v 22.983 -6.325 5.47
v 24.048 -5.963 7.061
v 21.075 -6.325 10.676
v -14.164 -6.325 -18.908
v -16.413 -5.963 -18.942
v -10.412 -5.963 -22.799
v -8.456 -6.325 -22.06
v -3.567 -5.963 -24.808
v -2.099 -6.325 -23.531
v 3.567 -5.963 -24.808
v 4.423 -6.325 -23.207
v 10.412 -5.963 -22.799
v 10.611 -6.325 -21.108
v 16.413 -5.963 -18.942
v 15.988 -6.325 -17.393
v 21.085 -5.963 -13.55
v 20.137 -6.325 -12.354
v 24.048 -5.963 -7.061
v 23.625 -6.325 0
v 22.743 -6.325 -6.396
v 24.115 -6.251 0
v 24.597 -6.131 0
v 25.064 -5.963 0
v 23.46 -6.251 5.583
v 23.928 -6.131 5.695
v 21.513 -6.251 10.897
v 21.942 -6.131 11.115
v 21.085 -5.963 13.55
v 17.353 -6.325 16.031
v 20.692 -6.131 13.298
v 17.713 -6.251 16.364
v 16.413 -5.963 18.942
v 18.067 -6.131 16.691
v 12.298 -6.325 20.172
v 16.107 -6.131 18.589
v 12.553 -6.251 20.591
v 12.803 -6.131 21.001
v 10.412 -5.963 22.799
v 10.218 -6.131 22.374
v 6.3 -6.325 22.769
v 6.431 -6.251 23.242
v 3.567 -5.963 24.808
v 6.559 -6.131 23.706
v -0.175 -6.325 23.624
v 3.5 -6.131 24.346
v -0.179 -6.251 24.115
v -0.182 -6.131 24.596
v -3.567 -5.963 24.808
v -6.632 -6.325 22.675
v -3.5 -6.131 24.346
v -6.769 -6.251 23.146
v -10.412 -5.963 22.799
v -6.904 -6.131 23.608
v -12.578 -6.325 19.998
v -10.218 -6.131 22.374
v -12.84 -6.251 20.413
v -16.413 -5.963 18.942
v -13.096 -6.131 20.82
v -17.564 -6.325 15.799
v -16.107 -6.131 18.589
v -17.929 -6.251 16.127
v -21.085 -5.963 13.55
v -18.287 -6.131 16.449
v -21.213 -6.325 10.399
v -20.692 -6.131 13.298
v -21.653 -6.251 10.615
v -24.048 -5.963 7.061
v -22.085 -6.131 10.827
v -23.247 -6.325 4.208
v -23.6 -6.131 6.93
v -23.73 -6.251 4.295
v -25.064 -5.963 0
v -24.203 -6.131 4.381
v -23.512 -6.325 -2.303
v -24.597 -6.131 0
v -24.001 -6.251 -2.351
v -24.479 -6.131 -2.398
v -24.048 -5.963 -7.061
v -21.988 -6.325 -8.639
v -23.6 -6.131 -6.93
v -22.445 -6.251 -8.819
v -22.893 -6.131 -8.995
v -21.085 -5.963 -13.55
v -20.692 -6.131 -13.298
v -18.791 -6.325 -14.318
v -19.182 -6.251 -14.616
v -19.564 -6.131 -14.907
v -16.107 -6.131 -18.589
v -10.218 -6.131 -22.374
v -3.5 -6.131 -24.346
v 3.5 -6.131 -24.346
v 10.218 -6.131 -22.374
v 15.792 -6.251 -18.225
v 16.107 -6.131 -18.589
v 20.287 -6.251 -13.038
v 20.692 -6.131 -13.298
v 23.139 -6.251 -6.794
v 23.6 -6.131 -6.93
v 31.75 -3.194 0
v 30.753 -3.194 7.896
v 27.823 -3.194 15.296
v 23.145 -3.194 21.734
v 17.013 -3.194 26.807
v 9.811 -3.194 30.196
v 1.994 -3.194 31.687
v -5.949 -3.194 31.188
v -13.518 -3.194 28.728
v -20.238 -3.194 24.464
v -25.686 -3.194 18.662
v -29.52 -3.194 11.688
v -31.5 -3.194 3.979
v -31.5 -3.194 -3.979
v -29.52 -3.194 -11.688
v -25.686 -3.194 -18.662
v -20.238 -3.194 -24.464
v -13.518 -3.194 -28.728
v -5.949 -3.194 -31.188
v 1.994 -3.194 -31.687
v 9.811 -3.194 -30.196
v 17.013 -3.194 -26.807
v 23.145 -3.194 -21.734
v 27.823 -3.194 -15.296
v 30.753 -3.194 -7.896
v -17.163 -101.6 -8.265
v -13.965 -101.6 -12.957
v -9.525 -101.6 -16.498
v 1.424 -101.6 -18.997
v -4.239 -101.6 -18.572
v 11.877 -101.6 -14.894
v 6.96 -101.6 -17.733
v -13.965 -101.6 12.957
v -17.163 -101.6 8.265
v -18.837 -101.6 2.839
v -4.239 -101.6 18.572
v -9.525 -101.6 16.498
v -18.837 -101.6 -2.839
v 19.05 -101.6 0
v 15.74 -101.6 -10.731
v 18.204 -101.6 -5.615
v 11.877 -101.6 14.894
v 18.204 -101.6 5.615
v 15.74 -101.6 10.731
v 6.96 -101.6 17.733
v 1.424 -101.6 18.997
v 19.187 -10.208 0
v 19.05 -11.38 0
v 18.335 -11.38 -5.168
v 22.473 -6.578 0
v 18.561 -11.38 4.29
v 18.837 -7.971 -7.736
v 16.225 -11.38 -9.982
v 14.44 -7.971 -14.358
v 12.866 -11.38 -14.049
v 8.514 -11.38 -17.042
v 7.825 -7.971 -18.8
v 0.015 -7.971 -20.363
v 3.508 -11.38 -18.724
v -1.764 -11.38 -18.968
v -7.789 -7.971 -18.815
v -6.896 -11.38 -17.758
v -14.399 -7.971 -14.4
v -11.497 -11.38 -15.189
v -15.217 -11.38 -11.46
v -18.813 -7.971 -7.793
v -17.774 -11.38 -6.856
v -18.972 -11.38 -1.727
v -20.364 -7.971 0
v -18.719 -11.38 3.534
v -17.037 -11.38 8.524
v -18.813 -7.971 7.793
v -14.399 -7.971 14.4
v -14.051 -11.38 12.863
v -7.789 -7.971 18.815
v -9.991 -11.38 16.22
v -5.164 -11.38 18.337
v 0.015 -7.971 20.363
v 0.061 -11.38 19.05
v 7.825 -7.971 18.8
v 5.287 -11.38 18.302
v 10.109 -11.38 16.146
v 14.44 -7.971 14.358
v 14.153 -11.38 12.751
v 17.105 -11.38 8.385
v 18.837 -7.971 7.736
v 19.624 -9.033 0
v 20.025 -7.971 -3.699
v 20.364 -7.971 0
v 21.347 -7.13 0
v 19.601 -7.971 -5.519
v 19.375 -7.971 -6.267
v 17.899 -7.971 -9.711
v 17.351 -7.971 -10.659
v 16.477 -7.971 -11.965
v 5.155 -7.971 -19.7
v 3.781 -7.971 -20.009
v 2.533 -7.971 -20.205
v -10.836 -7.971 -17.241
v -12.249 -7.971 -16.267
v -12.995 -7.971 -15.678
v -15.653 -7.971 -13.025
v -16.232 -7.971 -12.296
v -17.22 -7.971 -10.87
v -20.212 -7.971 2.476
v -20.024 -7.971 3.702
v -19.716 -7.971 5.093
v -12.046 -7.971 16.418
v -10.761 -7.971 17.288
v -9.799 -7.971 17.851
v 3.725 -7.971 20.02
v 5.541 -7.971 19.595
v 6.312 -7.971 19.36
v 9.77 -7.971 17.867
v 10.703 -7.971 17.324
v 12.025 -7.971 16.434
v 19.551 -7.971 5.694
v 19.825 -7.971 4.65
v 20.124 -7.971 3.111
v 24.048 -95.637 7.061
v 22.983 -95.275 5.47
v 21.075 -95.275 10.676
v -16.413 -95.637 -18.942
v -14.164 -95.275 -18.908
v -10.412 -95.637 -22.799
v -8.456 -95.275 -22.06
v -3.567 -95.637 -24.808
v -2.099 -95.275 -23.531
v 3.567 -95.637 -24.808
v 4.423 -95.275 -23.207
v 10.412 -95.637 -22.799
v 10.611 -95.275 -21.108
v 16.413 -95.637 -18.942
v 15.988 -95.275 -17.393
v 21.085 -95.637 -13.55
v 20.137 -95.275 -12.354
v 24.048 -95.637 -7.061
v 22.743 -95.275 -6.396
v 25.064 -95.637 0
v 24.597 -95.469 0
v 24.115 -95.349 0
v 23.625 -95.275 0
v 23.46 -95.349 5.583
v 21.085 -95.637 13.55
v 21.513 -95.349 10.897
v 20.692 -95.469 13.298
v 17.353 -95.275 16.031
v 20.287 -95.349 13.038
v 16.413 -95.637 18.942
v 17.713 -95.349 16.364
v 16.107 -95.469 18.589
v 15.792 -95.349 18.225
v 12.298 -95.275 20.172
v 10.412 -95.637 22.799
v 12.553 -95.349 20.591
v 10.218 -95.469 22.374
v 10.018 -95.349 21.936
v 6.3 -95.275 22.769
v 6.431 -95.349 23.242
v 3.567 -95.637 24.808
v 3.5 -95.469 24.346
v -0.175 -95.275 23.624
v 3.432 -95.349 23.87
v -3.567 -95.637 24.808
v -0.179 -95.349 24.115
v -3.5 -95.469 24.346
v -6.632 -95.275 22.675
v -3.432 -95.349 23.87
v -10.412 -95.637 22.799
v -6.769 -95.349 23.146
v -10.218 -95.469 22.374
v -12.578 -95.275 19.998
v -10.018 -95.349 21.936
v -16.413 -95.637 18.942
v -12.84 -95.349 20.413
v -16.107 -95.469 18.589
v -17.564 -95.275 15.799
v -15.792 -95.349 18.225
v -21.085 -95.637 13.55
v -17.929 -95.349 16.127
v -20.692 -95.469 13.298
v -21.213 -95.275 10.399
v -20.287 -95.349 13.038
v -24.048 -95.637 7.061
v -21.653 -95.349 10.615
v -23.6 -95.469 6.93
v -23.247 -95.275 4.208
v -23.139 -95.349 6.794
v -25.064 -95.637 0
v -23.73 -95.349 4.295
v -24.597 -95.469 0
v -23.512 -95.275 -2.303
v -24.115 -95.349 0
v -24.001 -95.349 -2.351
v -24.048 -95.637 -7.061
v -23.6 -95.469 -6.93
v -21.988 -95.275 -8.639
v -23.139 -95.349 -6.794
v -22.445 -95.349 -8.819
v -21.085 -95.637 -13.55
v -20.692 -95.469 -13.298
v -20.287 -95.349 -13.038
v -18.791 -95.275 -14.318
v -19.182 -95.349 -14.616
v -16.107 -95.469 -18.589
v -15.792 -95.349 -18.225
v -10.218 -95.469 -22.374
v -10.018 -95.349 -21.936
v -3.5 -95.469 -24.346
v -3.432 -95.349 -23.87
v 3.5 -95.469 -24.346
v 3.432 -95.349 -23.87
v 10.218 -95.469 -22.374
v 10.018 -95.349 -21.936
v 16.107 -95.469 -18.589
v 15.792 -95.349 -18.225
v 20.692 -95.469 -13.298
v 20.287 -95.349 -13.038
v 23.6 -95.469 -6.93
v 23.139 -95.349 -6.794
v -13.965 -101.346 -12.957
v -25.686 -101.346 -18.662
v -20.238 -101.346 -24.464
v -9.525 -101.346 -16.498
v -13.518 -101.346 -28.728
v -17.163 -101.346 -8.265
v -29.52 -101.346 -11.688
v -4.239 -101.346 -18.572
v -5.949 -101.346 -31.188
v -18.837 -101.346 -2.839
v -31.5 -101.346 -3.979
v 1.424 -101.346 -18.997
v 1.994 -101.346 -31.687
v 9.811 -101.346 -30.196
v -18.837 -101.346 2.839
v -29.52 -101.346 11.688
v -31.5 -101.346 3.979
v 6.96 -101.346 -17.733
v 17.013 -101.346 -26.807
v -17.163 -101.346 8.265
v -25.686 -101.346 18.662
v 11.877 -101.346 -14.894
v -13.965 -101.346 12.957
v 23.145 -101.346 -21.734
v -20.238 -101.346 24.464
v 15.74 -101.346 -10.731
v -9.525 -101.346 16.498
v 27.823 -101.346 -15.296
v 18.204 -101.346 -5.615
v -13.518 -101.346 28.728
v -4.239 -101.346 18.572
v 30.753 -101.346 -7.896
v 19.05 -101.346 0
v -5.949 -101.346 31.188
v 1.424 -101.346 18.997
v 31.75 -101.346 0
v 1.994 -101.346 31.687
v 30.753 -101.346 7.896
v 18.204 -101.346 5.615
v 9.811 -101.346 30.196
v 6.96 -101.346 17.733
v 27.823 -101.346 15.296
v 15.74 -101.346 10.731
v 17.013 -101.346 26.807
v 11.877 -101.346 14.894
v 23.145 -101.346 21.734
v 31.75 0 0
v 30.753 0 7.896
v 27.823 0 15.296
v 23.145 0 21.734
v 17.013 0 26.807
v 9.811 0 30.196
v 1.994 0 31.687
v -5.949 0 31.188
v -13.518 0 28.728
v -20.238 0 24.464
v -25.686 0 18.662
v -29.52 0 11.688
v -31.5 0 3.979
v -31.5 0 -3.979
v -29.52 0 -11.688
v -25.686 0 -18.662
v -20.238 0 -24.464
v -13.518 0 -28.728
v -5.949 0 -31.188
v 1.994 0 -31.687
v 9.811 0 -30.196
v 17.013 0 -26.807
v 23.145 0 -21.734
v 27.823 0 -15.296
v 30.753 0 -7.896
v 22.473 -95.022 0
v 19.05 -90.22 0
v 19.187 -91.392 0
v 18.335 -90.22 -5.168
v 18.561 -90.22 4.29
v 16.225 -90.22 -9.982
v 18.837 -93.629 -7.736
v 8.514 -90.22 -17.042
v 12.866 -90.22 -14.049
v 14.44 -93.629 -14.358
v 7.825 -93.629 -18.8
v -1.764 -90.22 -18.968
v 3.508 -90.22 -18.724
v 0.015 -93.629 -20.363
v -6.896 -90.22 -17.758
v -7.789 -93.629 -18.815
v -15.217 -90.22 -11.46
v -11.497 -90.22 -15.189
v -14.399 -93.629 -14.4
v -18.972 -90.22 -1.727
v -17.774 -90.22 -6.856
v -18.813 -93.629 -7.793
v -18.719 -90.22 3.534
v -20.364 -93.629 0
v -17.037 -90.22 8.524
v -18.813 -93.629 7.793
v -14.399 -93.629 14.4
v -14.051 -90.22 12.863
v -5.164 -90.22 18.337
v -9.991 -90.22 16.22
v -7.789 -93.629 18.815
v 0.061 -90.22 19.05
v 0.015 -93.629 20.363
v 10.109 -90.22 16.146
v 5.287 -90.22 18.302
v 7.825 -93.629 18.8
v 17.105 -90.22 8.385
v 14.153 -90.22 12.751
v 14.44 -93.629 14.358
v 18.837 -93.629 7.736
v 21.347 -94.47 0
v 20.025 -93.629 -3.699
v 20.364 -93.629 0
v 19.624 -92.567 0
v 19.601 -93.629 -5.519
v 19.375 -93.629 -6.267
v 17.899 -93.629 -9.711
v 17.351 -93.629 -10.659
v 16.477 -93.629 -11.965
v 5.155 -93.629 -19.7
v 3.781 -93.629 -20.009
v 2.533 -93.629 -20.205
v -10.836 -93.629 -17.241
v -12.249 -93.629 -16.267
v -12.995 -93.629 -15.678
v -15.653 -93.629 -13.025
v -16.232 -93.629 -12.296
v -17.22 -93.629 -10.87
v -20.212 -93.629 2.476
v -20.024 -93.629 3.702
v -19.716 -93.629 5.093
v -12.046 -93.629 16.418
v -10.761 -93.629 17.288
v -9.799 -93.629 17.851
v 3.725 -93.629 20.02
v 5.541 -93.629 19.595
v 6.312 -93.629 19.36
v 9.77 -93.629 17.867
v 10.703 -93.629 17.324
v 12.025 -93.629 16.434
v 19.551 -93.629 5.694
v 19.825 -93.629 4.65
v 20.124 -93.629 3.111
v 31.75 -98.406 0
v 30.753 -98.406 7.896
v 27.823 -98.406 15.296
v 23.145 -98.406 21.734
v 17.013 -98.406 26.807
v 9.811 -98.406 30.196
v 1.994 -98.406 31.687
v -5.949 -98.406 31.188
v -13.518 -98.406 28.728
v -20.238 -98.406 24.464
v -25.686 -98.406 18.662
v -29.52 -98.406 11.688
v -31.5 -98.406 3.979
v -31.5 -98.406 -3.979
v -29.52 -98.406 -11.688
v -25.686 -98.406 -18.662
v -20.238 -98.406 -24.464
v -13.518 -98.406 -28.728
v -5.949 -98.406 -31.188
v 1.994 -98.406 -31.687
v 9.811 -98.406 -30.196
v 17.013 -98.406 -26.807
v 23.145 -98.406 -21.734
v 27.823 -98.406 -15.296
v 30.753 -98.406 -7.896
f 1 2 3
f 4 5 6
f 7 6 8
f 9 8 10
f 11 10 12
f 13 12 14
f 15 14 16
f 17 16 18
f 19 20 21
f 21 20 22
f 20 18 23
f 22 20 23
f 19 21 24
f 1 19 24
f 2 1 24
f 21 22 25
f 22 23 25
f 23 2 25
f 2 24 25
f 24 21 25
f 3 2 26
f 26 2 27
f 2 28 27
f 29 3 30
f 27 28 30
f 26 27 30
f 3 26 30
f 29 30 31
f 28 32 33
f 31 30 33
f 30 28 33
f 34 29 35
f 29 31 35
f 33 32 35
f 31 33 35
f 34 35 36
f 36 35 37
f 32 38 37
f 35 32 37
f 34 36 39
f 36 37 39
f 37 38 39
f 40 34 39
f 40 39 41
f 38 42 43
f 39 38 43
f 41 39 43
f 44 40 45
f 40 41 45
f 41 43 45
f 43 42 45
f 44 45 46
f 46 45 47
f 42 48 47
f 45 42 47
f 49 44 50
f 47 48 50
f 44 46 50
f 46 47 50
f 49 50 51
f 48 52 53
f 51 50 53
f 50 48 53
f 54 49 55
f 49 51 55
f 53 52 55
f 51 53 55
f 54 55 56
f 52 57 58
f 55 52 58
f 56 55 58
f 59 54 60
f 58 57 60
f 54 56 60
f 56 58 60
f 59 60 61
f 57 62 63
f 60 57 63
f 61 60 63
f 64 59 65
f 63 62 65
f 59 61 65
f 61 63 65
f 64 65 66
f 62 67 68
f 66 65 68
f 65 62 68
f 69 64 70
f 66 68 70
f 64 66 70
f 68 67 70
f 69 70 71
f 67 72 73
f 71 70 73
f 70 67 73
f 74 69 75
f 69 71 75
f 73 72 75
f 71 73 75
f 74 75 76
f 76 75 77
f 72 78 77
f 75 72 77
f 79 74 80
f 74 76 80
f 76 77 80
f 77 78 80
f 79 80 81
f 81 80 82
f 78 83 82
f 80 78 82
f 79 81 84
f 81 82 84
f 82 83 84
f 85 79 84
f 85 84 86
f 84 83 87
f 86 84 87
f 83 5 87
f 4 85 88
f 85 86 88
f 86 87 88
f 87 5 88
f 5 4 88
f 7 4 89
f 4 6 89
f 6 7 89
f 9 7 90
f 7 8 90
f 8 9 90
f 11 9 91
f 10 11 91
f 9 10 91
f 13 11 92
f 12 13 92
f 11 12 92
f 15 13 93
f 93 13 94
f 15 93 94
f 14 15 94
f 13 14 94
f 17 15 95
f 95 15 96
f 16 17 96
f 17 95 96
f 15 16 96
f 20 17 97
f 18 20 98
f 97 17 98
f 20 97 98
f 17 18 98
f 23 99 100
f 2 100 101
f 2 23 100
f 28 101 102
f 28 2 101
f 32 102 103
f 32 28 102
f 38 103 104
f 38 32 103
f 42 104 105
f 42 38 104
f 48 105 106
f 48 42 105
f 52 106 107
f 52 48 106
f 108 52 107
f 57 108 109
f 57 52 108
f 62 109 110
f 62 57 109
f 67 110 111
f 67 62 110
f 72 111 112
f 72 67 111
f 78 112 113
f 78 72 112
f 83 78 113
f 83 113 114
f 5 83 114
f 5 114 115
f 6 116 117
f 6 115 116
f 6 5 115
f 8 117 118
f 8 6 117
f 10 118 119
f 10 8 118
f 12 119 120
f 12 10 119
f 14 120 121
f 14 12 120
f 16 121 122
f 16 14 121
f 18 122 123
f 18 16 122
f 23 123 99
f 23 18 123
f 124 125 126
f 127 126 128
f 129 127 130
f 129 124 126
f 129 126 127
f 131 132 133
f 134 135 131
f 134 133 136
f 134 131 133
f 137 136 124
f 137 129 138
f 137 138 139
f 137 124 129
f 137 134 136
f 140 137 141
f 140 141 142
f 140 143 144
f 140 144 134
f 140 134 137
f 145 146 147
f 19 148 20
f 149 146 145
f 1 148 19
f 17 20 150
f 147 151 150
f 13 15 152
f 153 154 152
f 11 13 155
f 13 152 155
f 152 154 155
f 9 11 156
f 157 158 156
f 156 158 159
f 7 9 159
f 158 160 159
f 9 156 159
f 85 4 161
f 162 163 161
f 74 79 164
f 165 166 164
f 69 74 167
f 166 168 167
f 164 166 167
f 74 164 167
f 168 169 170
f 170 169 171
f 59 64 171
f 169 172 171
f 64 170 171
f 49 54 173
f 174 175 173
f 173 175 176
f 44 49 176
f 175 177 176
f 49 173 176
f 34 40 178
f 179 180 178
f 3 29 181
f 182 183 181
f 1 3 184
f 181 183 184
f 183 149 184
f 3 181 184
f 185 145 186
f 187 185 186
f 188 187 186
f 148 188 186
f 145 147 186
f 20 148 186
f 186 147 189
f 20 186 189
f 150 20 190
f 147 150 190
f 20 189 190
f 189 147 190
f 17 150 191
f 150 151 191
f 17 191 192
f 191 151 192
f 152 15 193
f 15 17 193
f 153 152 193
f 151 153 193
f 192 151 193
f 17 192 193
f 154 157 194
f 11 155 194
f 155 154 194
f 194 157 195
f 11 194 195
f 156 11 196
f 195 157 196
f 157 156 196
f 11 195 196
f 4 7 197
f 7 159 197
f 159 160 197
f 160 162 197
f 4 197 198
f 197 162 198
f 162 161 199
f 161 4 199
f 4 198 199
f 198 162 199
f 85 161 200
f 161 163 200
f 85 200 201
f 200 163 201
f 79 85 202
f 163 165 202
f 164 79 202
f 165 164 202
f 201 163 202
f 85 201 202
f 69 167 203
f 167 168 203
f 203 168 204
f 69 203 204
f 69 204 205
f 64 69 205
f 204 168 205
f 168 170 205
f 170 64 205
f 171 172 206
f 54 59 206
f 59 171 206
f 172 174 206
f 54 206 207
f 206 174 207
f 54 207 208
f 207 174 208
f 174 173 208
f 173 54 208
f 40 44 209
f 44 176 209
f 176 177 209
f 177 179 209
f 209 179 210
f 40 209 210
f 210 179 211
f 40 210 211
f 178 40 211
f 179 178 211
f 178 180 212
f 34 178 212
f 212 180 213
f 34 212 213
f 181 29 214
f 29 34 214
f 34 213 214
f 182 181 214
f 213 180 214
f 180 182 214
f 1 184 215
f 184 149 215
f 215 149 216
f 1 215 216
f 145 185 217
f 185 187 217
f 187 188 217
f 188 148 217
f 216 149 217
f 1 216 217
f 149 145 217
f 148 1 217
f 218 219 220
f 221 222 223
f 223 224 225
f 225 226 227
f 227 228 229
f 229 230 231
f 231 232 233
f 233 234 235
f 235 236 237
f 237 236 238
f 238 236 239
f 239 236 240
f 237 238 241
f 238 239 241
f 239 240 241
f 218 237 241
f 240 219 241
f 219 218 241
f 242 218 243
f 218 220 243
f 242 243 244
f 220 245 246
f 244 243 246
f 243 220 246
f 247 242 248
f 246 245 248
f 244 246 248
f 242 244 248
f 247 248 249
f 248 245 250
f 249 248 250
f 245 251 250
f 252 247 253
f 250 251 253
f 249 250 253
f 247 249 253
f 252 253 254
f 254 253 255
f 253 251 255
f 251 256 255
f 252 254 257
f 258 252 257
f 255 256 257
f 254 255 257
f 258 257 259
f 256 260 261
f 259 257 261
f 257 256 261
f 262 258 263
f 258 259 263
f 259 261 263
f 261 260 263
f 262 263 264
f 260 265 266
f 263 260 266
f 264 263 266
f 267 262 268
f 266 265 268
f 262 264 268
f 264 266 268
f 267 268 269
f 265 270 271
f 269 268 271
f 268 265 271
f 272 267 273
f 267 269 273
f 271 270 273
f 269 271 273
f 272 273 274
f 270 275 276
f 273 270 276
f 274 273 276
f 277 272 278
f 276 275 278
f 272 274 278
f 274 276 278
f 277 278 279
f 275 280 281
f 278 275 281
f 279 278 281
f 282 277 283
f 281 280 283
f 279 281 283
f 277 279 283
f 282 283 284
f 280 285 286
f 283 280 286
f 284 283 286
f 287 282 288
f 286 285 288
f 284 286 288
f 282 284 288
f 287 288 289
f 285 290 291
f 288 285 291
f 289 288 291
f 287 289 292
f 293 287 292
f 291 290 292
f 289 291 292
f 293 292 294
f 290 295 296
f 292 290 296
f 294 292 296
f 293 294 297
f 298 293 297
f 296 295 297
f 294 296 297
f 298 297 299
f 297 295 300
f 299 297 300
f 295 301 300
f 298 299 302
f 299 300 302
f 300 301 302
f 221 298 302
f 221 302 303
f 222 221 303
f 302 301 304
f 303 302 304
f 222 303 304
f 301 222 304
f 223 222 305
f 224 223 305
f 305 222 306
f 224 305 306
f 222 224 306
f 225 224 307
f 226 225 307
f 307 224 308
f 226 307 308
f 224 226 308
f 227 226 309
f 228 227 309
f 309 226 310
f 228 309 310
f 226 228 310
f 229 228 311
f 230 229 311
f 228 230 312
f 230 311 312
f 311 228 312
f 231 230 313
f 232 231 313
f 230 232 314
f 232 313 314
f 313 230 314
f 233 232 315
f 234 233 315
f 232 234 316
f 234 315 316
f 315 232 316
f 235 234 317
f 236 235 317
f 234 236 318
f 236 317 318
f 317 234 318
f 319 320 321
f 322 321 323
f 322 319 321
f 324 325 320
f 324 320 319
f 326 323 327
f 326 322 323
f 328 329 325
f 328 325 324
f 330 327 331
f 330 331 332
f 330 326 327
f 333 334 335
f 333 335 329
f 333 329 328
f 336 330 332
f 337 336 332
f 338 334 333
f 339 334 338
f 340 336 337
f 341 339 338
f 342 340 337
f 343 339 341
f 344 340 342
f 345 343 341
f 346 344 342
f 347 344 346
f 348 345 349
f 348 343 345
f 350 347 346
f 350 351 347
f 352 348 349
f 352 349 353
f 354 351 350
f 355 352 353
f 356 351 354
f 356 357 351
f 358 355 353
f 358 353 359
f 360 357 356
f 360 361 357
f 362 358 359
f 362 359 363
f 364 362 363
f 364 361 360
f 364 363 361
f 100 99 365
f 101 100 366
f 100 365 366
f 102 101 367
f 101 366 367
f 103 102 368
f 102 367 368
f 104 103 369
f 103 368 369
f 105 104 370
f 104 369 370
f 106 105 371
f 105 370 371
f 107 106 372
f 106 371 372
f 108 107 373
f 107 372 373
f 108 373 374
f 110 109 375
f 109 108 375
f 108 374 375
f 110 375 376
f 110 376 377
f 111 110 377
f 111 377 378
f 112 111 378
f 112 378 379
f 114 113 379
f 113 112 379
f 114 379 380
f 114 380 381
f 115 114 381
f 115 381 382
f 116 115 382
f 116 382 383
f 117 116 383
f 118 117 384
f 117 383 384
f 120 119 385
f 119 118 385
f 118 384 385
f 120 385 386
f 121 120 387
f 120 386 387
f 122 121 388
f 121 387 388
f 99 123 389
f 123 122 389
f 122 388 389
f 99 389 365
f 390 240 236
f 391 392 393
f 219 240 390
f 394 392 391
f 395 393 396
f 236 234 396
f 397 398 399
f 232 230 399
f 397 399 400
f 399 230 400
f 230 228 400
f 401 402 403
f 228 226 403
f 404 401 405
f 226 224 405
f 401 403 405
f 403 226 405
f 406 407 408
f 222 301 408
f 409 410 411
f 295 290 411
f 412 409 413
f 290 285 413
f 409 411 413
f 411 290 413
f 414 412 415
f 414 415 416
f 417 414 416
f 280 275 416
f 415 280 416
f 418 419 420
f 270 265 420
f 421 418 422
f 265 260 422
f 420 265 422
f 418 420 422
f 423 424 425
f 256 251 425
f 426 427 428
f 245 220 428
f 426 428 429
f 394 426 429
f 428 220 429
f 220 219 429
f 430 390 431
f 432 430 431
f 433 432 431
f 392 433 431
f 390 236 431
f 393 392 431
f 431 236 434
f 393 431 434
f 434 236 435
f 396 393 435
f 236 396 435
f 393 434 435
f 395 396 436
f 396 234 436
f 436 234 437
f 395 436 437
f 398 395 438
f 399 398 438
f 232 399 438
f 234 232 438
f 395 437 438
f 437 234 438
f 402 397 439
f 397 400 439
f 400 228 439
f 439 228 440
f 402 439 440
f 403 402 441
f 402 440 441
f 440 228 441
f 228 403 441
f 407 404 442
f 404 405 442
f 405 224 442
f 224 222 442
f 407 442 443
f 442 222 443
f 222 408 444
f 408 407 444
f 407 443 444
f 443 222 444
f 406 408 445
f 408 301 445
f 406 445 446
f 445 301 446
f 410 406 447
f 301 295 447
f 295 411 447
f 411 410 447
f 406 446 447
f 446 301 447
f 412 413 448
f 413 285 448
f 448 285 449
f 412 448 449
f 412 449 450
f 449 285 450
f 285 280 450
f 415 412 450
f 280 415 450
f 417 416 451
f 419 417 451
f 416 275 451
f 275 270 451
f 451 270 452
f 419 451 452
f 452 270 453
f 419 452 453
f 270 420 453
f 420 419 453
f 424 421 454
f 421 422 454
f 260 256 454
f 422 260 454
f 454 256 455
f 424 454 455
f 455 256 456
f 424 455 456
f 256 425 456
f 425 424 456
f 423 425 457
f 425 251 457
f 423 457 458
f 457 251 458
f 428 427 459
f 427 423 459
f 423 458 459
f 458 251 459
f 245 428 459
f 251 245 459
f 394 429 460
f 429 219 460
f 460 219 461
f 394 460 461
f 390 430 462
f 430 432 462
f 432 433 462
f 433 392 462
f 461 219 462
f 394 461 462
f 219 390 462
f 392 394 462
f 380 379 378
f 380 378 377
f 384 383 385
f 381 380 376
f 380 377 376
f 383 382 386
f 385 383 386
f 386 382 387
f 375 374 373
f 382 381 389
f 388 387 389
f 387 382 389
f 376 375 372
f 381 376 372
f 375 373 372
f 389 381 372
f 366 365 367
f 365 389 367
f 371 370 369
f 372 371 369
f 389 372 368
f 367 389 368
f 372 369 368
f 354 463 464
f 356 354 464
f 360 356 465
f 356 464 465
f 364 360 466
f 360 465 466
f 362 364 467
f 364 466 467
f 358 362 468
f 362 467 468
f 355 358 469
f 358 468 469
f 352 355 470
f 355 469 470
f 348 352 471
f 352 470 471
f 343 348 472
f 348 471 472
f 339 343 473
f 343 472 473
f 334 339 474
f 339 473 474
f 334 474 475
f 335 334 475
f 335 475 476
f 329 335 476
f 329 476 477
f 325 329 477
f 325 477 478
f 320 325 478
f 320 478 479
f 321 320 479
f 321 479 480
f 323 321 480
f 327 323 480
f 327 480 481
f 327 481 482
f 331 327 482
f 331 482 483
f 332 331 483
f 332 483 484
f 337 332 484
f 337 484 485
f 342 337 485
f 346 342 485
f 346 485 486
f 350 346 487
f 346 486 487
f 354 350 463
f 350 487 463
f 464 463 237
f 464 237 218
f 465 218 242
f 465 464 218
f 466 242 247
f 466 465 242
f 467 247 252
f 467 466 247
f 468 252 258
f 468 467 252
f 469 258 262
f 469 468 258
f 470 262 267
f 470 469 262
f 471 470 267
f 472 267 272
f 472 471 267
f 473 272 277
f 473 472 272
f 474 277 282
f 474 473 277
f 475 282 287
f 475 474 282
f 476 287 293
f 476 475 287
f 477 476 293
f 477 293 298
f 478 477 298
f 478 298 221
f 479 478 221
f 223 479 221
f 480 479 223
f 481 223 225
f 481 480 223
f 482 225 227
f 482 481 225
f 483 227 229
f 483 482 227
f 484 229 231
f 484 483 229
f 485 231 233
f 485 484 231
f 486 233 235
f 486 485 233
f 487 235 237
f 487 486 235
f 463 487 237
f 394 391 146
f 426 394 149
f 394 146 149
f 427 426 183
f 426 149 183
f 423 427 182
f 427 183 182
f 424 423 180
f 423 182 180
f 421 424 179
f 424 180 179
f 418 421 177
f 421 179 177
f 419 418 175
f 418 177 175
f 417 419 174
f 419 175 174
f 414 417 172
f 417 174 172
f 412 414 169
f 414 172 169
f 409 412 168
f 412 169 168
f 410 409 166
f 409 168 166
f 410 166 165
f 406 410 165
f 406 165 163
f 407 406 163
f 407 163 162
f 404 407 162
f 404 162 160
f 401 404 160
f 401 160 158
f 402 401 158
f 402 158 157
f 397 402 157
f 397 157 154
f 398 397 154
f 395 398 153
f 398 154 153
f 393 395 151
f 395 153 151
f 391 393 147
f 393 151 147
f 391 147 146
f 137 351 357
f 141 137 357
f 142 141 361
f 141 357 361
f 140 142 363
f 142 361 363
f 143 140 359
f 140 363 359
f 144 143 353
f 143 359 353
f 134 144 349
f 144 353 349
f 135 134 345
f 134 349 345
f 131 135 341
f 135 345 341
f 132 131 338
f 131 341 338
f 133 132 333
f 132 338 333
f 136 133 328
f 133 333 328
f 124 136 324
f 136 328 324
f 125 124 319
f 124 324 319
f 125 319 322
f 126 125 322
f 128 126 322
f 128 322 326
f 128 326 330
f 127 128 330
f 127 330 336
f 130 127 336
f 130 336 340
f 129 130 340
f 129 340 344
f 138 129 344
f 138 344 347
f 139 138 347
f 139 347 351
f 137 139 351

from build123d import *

# Parameters (mm, degrees)
F0_R     = 19.05
F1_DEPTH = 101.6
F2_R     = 31.75
F3_DEPTH = 6.35
F5_START = 95.25
F4_R     = 31.75
F5_DEPTH = 6.096
F6_SIZE  = 2.54
F8_R     = 5.08
F9_R     = 5.08


# Not quite as in the source:
# - a fillet or chamfer that OpenCascade refuses, or shapes differently, is made with other operations: its cross-section is extruded or revolved along the edge and cut away or added


with BuildPart() as f1:
    # F0 (on Front) → F1 (new body)
    with BuildSketch(Plane.XZ):
        Circle(F0_R)
    extrude(amount=F1_DEPTH)

    # F2 (on Front) → F3 (join)
    with BuildSketch(Plane.XZ):
        Circle(F2_R)
    extrude(amount=F3_DEPTH)

    # F4 (on Front) → F5 (join)
    with BuildSketch(Plane.XZ.offset(F5_START)):
        Circle(F4_R)
    extrude(amount=F5_DEPTH)

    # F6
    f6_edges = [f1.edges().sort_by_distance(p)[0] for p in [
        (-31.75, -6.35, 0),
        (-31.75, -95.25, 0),
    ]]
    chamfer(f6_edges, length=F6_SIZE)

    # F7: chamfer of 5.08 on 2 edges, made by hand

    # F7_s1 → F7_t2 (revolve, cut)
    with BuildSketch(Plane.XY):
        Polygon((24.13, -95.25), (32.8021024484, -98.8421024484), (29.21, -95.25), align=None)
    revolve(axis=Axis((0, -95.25, 0), (0, -1, 0)), mode=Mode.SUBTRACT)

    # F7_s3 → F7_t4 (revolve, cut)
    with BuildSketch(Plane.XY):
        Polygon((32.8021024484, -2.7578975516), (24.13, -6.35), (29.21, -6.35), align=None)
    revolve(axis=Axis((0, -6.35, 0), (0, -1, 0)), mode=Mode.SUBTRACT)

    # F8
    f8_edges = [f1.edges().sort_by_distance(p)[0] for p in [
        (-24.13, -6.35, 0),
        (-24.13, -95.25, 0),
    ]]
    fillet(f8_edges, radius=F8_R)

    # F9
    f9_edges = [f1.edges().sort_by_distance(p)[0] for p in [
        (-19.05, -95.25, 0),
        (-19.05, -6.35, 0),
    ]]
    fillet(f9_edges, radius=F9_R)


solid = f1.part
